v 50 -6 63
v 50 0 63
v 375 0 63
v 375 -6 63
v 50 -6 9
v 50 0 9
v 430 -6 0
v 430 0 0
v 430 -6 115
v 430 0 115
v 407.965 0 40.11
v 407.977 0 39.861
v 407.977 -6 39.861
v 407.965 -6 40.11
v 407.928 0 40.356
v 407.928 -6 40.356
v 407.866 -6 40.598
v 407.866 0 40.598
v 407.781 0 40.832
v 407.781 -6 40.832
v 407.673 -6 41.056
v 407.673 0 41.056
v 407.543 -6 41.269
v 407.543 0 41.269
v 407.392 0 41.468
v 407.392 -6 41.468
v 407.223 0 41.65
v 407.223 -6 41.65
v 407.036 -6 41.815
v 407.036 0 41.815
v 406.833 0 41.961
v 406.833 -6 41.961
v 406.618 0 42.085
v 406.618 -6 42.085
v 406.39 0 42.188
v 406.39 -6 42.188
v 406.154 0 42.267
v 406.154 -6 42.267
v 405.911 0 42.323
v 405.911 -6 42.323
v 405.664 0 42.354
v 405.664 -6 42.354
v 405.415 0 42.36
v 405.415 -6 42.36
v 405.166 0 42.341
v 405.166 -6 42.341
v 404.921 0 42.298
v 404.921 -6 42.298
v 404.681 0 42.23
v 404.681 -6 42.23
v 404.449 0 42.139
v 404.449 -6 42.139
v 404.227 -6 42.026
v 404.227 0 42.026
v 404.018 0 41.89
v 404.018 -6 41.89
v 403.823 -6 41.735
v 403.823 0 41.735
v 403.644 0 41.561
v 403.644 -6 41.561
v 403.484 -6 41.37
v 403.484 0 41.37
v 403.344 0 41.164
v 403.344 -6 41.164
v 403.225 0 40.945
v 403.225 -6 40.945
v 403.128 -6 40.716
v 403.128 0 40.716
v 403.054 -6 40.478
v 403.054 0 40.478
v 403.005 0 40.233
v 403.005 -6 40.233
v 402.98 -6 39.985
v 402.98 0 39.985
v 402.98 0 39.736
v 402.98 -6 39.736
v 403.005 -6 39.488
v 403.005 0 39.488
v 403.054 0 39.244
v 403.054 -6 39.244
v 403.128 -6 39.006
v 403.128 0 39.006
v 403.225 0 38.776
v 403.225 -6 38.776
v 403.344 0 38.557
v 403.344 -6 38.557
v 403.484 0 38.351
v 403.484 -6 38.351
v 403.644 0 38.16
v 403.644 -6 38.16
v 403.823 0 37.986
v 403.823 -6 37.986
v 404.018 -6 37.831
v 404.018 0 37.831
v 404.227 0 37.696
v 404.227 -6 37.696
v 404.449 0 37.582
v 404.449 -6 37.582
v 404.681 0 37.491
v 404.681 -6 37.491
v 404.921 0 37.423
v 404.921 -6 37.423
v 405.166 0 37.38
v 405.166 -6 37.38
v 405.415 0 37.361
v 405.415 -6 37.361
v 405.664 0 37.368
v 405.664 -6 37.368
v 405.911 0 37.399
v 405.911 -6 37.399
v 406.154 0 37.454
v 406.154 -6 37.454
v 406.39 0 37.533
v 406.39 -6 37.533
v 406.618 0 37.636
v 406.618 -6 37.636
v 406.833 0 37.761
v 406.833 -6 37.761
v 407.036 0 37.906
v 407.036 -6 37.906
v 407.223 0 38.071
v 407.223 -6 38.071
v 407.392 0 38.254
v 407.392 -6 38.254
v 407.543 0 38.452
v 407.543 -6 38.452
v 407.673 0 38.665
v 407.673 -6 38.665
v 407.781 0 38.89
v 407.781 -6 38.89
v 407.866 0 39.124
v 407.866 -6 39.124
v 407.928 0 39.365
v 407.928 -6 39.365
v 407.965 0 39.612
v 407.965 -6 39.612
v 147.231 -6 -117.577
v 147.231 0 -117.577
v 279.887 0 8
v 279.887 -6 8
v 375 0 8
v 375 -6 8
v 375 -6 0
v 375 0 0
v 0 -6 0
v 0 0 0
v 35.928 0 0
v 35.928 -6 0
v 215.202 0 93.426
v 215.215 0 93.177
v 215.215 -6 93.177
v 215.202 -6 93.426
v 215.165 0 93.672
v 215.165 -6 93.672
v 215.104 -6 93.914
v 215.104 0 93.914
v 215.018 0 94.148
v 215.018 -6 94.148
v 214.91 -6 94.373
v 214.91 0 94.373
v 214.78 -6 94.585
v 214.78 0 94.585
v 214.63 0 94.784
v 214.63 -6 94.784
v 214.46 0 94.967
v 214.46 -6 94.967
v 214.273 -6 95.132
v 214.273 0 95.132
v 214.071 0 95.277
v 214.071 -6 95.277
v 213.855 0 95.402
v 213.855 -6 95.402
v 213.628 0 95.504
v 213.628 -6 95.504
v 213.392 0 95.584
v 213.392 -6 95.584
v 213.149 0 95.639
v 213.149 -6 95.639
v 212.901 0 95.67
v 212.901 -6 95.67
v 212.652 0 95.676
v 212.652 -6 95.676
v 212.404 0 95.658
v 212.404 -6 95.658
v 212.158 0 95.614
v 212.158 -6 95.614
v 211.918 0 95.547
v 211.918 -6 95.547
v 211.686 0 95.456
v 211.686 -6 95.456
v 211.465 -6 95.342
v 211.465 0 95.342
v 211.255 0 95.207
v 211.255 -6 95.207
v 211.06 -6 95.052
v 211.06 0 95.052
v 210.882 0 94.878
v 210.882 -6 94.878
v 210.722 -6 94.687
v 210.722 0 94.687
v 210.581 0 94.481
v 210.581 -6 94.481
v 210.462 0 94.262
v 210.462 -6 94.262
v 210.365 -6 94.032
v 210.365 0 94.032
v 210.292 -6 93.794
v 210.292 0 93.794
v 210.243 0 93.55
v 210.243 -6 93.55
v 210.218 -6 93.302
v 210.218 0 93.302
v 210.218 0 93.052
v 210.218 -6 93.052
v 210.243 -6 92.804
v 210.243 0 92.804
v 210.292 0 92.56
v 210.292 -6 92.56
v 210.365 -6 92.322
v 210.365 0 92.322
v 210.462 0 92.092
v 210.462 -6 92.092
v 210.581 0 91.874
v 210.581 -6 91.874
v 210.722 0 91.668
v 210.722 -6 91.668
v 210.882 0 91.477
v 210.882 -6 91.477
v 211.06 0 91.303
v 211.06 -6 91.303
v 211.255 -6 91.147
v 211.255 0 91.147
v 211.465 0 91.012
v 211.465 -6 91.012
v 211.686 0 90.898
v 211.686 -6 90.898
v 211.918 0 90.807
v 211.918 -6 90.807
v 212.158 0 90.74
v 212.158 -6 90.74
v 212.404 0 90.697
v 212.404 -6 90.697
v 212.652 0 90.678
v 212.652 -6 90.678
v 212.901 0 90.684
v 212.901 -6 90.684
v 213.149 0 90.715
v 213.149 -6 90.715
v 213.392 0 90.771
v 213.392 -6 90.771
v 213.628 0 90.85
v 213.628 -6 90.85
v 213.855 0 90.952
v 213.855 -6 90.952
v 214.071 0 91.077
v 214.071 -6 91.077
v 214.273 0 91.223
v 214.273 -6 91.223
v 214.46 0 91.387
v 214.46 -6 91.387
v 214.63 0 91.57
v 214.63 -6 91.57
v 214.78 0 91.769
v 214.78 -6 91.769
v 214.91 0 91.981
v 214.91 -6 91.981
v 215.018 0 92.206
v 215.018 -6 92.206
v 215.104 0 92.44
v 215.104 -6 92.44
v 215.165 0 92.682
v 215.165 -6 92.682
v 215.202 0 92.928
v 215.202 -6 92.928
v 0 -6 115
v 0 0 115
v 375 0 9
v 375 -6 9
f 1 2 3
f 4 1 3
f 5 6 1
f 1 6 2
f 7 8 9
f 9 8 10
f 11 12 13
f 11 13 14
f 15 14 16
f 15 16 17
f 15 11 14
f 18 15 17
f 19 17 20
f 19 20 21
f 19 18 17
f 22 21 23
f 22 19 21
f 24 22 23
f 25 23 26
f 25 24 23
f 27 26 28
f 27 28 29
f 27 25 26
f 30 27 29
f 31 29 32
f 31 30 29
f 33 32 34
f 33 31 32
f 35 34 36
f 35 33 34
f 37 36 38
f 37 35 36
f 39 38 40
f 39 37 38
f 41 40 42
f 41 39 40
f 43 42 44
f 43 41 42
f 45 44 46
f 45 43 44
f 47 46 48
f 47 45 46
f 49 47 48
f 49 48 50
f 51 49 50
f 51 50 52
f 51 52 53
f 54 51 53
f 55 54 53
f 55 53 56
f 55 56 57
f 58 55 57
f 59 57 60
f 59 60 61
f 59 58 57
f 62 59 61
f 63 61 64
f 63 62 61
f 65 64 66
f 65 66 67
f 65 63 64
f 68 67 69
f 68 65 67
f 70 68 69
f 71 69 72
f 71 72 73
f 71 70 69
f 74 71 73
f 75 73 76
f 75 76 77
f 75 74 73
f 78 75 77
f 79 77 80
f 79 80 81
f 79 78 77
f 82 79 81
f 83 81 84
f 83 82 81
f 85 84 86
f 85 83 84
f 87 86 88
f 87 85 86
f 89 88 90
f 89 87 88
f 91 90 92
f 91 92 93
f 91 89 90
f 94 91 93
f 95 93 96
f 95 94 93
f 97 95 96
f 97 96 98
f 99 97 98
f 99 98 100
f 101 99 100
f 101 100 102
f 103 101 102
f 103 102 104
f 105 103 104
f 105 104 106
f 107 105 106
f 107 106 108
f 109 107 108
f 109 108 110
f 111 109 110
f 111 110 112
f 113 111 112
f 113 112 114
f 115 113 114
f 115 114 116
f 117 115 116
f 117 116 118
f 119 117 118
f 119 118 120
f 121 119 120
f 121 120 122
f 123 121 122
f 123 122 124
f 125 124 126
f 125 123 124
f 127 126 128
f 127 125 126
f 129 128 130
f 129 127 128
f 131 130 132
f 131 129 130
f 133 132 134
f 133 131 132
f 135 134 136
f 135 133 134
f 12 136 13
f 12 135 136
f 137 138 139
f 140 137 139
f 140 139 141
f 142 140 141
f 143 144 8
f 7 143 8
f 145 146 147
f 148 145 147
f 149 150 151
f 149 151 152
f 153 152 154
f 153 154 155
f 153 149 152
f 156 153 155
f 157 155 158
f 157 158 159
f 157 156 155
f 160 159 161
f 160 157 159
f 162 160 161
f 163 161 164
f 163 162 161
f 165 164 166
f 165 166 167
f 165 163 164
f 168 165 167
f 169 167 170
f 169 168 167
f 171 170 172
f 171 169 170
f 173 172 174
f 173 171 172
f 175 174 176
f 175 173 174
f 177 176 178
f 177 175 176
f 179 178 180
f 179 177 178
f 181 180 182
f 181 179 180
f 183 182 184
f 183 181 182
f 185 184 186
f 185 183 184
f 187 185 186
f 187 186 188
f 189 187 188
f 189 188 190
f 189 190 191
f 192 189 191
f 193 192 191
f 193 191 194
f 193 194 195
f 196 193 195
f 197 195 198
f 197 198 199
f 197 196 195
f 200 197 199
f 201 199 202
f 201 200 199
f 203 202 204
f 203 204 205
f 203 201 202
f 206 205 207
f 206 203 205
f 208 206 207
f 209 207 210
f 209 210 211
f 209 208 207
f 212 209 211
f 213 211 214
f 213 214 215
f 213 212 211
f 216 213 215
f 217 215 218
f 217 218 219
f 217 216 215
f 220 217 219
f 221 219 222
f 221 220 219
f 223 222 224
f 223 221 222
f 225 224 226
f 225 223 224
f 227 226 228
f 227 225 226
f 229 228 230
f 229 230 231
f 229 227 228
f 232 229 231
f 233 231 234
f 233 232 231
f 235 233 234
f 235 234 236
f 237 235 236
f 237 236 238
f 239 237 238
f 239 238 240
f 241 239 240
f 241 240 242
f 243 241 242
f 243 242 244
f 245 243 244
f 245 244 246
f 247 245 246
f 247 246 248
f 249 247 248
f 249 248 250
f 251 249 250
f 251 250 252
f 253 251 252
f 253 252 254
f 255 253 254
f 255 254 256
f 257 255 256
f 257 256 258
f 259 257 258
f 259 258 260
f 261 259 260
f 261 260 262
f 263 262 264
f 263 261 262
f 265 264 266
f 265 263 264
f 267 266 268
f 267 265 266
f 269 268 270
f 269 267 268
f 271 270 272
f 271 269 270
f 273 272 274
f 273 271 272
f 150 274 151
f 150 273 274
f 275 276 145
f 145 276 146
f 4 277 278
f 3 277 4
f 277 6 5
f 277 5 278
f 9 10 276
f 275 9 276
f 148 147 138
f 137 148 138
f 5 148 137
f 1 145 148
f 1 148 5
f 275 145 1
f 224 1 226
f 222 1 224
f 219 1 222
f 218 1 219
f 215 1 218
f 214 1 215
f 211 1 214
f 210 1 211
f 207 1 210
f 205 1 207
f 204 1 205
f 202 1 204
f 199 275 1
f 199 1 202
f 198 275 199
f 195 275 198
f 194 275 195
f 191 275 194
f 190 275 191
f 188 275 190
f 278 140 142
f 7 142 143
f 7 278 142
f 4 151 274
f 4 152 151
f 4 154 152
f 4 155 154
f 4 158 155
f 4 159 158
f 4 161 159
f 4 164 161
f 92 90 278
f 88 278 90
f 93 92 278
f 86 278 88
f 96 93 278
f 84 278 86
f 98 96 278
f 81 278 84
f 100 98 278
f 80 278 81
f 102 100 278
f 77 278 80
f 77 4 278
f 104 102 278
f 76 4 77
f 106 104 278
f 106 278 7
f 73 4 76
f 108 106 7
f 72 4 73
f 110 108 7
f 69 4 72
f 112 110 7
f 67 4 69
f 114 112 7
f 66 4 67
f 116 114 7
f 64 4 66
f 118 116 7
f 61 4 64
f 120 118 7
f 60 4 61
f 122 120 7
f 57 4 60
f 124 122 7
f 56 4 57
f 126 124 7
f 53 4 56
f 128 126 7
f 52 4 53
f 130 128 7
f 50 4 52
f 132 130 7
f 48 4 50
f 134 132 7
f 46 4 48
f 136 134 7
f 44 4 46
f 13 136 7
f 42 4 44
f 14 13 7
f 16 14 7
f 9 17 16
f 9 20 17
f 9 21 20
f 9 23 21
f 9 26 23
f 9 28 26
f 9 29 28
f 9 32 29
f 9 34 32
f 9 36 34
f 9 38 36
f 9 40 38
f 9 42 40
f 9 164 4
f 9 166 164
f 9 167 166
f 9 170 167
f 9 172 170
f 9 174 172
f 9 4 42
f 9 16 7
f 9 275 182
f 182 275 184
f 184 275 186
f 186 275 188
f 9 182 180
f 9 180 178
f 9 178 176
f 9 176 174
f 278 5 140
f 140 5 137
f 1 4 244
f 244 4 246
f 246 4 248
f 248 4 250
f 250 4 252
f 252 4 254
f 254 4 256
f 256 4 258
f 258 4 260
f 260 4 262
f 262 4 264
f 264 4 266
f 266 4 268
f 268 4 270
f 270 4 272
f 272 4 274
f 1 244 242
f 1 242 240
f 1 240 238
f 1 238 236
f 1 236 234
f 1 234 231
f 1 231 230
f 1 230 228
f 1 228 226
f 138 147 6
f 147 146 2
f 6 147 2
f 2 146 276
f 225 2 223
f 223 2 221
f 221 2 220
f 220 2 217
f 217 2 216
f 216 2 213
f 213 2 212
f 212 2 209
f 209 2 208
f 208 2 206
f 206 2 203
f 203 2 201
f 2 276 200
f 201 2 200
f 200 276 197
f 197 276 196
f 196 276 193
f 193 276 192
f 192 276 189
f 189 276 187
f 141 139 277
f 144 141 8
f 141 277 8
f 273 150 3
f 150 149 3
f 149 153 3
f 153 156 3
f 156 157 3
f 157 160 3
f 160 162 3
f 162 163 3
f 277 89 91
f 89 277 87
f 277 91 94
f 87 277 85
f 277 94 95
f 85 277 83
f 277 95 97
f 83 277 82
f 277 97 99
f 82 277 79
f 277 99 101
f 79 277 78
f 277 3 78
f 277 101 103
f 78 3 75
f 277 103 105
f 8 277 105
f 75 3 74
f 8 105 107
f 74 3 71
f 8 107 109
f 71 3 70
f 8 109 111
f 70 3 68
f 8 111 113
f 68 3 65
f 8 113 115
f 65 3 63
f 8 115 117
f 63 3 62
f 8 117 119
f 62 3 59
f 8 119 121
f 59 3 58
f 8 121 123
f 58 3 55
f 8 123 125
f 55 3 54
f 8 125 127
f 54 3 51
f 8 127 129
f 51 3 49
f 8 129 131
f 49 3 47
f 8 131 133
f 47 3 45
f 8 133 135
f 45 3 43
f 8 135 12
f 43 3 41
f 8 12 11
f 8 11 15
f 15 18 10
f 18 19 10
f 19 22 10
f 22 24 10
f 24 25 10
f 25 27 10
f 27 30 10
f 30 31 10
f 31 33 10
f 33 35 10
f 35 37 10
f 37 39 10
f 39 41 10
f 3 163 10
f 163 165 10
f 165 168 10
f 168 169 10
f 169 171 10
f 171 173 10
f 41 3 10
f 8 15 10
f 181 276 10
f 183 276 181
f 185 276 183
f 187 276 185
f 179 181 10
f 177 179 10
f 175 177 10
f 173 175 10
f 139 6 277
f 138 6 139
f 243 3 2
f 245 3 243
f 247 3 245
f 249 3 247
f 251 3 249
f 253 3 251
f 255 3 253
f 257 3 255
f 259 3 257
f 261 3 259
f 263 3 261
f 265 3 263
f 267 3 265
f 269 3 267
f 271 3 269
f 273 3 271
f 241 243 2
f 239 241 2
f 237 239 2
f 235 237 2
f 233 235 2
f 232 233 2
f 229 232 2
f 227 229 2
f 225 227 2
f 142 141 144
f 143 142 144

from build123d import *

# Parameters (mm, degrees)
F0_W     = 325
F0_H     = 54
F0_R     = 2.5
F1_DEPTH = 6


# Not quite as in the source:
# - a feature names something its author has since deleted; it is built from what else it names


with BuildPart() as f1:
    # F0 (on Front) → F1 (new body)
    with BuildSketch(Plane.XZ):
        Polygon((0, 115), (0, 0), (35.9275913919, 0), (50, 0), (50, 8), (279.8869819123, 8), (375, 8), (375, 0), (430, 0), (430, 115), align=None)
        with Locations((212.5, 36)):
            Rectangle(F0_W, F0_H, mode=Mode.SUBTRACT)
        with Locations((212.7146603412, 93.1771022268)):
            Circle(F0_R, mode=Mode.SUBTRACT)
        with Locations((405.4770870114, 39.8606238714)):
            Circle(F0_R, mode=Mode.SUBTRACT)
        Polygon((50, 0), (35.9275913919, 0), (147.2313553095, -117.5774261355), (279.8869819123, 8), (50, 8), align=None)
    extrude(amount=F1_DEPTH)


solid = f1.part
